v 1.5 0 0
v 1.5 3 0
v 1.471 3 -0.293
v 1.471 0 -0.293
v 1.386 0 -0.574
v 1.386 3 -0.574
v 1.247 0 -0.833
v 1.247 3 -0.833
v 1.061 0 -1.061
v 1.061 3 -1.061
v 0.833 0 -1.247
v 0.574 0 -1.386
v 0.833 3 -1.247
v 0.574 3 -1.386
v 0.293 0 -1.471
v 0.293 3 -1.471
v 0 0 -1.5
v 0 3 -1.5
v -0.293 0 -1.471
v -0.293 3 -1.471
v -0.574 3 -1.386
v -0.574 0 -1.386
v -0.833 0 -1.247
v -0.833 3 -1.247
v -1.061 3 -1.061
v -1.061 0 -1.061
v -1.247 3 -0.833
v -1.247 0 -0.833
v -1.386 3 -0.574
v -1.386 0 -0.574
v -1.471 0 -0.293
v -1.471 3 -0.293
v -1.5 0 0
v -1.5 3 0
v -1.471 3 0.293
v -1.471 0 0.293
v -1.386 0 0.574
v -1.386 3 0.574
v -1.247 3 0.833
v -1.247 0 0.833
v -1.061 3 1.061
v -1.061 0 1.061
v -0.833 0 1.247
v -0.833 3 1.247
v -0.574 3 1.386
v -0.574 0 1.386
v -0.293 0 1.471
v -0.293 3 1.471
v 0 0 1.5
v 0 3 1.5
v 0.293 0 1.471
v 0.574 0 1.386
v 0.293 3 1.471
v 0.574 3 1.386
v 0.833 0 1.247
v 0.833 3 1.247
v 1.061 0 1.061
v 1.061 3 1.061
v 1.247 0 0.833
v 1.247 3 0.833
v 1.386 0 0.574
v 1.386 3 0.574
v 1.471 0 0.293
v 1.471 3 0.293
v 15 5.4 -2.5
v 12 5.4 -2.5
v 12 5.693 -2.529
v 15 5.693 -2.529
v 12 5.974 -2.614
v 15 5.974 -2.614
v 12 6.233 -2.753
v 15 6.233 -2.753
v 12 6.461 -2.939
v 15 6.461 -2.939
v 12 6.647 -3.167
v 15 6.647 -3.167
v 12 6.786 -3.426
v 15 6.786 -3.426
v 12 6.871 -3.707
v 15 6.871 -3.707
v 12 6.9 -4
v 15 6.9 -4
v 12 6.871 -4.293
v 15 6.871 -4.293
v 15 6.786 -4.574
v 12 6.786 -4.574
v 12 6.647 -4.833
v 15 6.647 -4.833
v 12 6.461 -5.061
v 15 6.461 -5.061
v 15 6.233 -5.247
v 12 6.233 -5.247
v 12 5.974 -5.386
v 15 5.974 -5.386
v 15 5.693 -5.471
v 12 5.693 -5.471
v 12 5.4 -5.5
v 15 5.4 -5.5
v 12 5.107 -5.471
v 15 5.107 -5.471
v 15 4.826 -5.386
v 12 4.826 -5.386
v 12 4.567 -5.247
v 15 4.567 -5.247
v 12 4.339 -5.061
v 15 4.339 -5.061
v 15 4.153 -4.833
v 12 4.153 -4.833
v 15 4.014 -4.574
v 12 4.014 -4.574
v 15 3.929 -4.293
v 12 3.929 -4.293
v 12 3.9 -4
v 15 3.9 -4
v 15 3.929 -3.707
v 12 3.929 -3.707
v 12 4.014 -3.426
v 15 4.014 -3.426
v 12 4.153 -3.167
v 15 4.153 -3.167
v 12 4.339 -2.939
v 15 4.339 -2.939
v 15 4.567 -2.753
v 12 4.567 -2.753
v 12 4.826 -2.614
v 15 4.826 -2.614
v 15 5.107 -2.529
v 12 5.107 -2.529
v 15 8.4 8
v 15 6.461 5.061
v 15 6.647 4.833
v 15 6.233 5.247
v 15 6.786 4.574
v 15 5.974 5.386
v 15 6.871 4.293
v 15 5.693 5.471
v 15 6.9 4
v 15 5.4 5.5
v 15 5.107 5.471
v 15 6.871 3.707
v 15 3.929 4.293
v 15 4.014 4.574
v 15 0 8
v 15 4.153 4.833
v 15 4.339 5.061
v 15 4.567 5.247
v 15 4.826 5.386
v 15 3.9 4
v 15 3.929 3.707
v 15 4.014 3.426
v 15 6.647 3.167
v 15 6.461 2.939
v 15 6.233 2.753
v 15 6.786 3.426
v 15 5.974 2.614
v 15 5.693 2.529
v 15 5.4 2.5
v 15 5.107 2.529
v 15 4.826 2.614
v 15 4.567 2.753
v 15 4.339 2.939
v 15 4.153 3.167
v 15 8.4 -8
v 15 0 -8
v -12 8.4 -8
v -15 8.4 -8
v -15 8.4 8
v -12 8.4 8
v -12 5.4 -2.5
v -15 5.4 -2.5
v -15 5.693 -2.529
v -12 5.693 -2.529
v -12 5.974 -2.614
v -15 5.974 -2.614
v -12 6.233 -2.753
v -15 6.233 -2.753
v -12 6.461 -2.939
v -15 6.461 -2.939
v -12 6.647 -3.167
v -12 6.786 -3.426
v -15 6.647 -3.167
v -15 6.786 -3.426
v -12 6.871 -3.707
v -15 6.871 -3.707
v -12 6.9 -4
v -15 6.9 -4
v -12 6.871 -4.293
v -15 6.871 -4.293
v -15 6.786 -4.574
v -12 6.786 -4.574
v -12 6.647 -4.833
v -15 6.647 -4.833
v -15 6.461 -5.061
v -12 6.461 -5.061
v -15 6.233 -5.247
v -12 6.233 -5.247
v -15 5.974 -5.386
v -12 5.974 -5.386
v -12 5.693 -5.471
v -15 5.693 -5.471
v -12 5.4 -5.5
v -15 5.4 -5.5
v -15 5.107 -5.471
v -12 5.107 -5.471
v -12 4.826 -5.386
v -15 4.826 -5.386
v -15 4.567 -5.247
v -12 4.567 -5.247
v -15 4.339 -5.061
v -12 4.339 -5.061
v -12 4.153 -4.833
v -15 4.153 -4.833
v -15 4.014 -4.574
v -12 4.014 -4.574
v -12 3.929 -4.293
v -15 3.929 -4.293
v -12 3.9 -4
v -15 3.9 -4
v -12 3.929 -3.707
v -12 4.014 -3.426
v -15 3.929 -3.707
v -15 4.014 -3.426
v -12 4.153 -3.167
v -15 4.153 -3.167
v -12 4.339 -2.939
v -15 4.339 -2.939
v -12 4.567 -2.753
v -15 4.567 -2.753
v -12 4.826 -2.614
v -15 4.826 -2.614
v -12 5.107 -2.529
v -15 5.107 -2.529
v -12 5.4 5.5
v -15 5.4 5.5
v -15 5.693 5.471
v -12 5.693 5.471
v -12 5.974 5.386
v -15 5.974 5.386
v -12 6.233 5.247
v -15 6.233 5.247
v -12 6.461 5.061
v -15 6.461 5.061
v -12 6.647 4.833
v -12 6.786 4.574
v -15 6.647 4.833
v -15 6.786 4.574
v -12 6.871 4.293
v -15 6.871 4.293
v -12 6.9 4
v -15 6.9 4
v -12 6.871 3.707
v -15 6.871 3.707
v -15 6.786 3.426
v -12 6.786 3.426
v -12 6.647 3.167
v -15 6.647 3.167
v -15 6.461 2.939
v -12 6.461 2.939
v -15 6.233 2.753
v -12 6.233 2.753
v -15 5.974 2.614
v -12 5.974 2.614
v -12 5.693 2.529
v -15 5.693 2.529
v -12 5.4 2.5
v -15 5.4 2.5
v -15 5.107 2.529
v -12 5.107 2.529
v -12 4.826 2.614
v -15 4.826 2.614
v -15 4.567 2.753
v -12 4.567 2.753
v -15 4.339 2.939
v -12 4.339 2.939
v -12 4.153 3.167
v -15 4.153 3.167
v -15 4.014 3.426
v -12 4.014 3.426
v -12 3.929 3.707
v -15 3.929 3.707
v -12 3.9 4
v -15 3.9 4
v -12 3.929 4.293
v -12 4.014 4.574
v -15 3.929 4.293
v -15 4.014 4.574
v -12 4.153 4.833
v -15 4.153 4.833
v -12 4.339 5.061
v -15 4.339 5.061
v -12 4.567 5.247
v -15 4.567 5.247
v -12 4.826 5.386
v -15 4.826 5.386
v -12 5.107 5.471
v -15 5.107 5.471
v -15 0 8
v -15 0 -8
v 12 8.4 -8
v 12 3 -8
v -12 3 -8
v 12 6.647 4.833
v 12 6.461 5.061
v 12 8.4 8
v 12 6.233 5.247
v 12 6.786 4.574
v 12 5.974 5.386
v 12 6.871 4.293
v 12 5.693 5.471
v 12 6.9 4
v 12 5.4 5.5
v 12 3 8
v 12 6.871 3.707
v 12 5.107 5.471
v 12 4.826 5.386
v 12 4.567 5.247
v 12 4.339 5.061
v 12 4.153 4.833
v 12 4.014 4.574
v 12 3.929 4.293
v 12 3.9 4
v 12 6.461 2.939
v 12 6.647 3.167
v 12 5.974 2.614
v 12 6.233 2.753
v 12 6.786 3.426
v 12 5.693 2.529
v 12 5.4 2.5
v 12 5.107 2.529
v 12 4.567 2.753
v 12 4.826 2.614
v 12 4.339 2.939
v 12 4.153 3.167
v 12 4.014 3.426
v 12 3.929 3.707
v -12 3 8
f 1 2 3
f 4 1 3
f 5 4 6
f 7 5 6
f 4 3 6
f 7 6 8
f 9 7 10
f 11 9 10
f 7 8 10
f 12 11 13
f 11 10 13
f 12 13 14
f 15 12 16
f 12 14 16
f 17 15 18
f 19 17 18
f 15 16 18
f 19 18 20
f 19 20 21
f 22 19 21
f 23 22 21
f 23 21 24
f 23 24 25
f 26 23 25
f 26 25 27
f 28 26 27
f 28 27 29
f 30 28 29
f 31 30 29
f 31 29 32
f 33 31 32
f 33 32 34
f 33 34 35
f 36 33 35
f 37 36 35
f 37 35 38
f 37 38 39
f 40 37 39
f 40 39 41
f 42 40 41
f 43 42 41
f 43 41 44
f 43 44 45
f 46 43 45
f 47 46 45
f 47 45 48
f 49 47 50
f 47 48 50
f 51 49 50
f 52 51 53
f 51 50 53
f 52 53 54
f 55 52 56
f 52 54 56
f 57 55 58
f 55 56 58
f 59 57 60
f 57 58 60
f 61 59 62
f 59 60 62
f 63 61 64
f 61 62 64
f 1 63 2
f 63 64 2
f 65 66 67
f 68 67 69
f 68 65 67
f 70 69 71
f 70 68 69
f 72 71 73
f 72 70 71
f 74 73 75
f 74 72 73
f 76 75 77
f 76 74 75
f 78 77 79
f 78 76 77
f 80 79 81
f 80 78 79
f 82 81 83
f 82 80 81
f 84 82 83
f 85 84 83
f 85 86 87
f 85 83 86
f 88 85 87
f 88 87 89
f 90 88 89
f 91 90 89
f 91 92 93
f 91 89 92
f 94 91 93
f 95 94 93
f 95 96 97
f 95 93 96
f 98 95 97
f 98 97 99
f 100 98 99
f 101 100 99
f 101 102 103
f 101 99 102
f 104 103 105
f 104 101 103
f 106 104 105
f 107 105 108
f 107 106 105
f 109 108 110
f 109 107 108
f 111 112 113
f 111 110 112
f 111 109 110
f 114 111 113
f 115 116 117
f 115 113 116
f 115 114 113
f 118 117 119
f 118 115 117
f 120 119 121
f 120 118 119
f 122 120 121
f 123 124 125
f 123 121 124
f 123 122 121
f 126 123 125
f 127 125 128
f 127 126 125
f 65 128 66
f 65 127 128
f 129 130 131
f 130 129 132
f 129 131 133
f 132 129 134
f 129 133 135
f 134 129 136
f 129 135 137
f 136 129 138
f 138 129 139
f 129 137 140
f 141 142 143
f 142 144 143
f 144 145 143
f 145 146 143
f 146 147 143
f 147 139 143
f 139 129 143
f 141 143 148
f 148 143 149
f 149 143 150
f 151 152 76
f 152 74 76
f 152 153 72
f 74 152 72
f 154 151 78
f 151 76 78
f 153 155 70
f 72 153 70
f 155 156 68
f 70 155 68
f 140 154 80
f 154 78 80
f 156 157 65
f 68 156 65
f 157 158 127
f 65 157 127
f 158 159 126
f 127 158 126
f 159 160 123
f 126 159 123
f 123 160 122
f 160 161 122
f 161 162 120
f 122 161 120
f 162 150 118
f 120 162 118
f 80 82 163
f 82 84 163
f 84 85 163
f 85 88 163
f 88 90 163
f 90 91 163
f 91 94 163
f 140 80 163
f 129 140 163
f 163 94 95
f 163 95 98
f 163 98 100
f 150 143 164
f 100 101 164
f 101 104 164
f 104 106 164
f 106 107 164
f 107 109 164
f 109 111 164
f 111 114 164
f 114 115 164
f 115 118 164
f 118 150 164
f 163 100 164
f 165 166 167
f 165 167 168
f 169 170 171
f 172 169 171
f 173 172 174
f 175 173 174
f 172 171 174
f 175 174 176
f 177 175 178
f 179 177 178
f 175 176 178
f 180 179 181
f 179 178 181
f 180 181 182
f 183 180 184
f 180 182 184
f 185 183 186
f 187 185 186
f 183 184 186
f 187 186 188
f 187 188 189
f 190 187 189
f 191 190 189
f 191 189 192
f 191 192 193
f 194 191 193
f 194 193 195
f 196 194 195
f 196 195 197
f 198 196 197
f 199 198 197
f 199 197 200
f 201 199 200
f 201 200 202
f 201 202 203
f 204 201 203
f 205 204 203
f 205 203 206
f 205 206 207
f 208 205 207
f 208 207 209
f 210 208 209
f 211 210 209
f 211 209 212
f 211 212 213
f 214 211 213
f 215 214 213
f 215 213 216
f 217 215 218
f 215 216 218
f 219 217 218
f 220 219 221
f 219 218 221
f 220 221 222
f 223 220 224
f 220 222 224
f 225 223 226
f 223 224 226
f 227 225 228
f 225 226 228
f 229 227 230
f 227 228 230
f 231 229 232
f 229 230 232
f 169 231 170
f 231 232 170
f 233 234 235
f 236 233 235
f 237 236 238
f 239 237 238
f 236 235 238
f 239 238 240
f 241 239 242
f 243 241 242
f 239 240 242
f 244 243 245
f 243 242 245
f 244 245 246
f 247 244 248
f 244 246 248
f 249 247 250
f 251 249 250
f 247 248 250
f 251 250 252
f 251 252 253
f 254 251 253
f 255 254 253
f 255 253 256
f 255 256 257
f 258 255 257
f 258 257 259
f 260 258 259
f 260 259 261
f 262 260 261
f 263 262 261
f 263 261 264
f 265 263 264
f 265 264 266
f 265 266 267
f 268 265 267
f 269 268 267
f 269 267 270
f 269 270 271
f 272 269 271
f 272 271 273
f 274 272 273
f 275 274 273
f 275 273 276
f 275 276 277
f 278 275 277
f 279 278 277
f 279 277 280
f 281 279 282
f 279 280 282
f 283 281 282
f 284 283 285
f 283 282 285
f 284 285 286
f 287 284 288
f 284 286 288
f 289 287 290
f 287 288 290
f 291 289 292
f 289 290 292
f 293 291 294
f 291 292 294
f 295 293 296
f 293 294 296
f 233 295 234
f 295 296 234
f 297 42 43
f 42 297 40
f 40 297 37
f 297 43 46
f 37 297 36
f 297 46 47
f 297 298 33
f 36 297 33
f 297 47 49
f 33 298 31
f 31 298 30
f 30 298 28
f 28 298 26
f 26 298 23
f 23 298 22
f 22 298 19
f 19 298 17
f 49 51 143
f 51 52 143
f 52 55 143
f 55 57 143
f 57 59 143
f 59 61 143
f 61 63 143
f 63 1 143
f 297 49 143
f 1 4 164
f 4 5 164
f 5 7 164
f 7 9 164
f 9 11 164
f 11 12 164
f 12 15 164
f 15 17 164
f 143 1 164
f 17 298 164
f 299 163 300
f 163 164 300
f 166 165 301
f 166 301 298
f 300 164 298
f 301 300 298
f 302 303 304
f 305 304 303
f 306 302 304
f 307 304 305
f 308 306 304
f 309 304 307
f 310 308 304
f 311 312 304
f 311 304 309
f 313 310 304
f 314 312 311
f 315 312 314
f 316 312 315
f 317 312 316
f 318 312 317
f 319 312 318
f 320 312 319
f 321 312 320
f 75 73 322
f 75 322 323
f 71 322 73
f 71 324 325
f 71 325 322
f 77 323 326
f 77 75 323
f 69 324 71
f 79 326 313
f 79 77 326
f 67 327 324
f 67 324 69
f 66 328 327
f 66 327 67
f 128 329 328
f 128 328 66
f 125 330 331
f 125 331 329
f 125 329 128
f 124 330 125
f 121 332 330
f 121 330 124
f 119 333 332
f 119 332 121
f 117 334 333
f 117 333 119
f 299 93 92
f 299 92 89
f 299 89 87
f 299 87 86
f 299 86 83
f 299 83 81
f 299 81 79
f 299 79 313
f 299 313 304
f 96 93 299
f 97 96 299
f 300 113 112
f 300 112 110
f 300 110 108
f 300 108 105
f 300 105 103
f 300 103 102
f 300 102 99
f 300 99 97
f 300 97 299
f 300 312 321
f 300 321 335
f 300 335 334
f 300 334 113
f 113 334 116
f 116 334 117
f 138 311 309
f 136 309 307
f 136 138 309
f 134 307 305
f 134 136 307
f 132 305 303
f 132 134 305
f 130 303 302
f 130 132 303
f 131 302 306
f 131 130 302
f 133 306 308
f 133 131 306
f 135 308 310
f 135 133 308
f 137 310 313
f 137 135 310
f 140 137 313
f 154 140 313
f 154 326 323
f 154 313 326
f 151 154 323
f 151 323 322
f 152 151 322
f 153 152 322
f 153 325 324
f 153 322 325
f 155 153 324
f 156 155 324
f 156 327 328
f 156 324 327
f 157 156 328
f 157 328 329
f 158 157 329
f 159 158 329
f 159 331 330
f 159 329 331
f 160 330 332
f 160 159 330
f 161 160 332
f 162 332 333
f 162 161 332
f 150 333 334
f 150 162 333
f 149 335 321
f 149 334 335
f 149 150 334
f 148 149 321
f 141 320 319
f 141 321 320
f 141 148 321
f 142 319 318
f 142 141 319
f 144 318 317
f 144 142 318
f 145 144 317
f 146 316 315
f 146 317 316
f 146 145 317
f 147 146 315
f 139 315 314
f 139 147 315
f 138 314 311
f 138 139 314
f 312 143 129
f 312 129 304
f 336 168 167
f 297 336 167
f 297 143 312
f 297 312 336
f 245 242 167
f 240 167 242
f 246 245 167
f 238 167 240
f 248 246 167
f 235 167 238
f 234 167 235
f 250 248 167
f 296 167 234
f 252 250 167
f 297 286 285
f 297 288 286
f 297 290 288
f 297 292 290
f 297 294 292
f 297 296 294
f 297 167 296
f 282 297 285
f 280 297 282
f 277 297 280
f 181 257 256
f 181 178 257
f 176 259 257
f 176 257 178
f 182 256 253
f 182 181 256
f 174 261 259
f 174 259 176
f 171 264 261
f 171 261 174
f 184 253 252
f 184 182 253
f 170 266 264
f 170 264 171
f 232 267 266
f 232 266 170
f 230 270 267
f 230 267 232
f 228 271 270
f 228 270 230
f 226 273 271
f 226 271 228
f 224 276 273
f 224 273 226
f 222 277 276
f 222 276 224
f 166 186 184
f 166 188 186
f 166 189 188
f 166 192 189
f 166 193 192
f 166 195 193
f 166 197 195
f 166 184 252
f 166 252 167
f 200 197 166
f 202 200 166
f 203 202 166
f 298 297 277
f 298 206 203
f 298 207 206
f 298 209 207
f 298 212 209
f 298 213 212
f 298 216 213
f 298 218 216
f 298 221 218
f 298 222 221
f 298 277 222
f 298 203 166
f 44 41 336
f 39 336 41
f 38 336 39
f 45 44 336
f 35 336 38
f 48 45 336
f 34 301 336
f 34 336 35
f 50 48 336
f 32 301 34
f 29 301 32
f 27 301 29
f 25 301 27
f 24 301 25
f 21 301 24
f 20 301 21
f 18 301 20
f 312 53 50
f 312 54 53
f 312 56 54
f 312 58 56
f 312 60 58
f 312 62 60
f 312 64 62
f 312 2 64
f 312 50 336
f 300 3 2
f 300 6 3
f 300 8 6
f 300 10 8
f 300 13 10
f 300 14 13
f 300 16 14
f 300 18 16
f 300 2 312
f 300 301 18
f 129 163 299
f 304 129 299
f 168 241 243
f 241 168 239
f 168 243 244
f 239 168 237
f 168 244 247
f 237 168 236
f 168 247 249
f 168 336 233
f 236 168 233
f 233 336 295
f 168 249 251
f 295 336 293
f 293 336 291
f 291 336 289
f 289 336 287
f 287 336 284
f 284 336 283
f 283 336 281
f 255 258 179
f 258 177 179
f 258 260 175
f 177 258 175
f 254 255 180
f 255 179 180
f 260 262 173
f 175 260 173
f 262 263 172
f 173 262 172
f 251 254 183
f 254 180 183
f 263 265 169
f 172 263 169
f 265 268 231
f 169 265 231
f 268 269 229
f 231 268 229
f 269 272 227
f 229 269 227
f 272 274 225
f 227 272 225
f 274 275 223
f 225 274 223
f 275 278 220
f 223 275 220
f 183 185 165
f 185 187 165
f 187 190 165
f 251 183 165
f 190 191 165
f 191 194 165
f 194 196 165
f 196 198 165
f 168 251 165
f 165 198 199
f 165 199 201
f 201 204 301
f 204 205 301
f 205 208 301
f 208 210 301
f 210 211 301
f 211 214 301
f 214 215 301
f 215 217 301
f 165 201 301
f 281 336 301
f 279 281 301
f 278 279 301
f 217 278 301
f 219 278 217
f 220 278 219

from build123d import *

# Parameters (mm, degrees)
SKETCH1_W           = 30
SKETCH1_H           = 16
BOSS_EXTRUDE1_DEPTH = 3
SKETCH2_W           = 3
SKETCH2_H           = 16
BOSS_EXTRUDE2_DEPTH = 5.4
SKETCH3_R           = 1.5
CUT_EXTRUDE1_DEPTH  = 5.4
SKETCH4_R           = 1.5
CUT_EXTRUDE2_DEPTH  = 10


with BuildPart() as part:
    # Sketch1 → Boss-Extrude1 (new body)
    with BuildSketch(Plane(origin=(0, 0, 0), x_dir=(1, 0, 0), z_dir=(0, 1, 0))):
        Rectangle(SKETCH1_W, SKETCH1_H)
    extrude(amount=BOSS_EXTRUDE1_DEPTH)

    # Sketch2 → Boss-Extrude2 (add)
    with BuildSketch(Plane(origin=(0, 3, 0), x_dir=(1, 0, 0), z_dir=(0, 1, 0))):
        with Locations((-13.5, 0)):
            Rectangle(SKETCH2_W, SKETCH2_H)
    boss_extrude2 = extrude(amount=BOSS_EXTRUDE2_DEPTH)

    # Sketch3 → Cut-Extrude1 (cut)
    with BuildSketch(Plane.ZY.offset(15)):
        with Locations((-4, 5.4)):
            Circle(SKETCH3_R)
        with Locations((4, 5.4)):
            Circle(SKETCH3_R)
    cut_extrude1 = extrude(amount=-CUT_EXTRUDE1_DEPTH, mode=Mode.SUBTRACT)

    # Mirror1: Boss-Extrude2, Cut-Extrude1 across plane
    add(boss_extrude2.mirror(Plane(origin=(0, 0, 0), x_dir=(0, 0, 1), z_dir=(1, 0, 0))))
    add(cut_extrude1.mirror(Plane(origin=(0, 0, 0), x_dir=(0, 0, 1), z_dir=(1, 0, 0))), mode=Mode.SUBTRACT)

    # Sketch4 → Cut-Extrude2 (cut)
    with BuildSketch(Plane(origin=(0, 3, 0), x_dir=(1, 0, 0), z_dir=(0, 1, 0))):
        Circle(SKETCH4_R)
    extrude(amount=-CUT_EXTRUDE2_DEPTH, mode=Mode.SUBTRACT)


solid = part.part
